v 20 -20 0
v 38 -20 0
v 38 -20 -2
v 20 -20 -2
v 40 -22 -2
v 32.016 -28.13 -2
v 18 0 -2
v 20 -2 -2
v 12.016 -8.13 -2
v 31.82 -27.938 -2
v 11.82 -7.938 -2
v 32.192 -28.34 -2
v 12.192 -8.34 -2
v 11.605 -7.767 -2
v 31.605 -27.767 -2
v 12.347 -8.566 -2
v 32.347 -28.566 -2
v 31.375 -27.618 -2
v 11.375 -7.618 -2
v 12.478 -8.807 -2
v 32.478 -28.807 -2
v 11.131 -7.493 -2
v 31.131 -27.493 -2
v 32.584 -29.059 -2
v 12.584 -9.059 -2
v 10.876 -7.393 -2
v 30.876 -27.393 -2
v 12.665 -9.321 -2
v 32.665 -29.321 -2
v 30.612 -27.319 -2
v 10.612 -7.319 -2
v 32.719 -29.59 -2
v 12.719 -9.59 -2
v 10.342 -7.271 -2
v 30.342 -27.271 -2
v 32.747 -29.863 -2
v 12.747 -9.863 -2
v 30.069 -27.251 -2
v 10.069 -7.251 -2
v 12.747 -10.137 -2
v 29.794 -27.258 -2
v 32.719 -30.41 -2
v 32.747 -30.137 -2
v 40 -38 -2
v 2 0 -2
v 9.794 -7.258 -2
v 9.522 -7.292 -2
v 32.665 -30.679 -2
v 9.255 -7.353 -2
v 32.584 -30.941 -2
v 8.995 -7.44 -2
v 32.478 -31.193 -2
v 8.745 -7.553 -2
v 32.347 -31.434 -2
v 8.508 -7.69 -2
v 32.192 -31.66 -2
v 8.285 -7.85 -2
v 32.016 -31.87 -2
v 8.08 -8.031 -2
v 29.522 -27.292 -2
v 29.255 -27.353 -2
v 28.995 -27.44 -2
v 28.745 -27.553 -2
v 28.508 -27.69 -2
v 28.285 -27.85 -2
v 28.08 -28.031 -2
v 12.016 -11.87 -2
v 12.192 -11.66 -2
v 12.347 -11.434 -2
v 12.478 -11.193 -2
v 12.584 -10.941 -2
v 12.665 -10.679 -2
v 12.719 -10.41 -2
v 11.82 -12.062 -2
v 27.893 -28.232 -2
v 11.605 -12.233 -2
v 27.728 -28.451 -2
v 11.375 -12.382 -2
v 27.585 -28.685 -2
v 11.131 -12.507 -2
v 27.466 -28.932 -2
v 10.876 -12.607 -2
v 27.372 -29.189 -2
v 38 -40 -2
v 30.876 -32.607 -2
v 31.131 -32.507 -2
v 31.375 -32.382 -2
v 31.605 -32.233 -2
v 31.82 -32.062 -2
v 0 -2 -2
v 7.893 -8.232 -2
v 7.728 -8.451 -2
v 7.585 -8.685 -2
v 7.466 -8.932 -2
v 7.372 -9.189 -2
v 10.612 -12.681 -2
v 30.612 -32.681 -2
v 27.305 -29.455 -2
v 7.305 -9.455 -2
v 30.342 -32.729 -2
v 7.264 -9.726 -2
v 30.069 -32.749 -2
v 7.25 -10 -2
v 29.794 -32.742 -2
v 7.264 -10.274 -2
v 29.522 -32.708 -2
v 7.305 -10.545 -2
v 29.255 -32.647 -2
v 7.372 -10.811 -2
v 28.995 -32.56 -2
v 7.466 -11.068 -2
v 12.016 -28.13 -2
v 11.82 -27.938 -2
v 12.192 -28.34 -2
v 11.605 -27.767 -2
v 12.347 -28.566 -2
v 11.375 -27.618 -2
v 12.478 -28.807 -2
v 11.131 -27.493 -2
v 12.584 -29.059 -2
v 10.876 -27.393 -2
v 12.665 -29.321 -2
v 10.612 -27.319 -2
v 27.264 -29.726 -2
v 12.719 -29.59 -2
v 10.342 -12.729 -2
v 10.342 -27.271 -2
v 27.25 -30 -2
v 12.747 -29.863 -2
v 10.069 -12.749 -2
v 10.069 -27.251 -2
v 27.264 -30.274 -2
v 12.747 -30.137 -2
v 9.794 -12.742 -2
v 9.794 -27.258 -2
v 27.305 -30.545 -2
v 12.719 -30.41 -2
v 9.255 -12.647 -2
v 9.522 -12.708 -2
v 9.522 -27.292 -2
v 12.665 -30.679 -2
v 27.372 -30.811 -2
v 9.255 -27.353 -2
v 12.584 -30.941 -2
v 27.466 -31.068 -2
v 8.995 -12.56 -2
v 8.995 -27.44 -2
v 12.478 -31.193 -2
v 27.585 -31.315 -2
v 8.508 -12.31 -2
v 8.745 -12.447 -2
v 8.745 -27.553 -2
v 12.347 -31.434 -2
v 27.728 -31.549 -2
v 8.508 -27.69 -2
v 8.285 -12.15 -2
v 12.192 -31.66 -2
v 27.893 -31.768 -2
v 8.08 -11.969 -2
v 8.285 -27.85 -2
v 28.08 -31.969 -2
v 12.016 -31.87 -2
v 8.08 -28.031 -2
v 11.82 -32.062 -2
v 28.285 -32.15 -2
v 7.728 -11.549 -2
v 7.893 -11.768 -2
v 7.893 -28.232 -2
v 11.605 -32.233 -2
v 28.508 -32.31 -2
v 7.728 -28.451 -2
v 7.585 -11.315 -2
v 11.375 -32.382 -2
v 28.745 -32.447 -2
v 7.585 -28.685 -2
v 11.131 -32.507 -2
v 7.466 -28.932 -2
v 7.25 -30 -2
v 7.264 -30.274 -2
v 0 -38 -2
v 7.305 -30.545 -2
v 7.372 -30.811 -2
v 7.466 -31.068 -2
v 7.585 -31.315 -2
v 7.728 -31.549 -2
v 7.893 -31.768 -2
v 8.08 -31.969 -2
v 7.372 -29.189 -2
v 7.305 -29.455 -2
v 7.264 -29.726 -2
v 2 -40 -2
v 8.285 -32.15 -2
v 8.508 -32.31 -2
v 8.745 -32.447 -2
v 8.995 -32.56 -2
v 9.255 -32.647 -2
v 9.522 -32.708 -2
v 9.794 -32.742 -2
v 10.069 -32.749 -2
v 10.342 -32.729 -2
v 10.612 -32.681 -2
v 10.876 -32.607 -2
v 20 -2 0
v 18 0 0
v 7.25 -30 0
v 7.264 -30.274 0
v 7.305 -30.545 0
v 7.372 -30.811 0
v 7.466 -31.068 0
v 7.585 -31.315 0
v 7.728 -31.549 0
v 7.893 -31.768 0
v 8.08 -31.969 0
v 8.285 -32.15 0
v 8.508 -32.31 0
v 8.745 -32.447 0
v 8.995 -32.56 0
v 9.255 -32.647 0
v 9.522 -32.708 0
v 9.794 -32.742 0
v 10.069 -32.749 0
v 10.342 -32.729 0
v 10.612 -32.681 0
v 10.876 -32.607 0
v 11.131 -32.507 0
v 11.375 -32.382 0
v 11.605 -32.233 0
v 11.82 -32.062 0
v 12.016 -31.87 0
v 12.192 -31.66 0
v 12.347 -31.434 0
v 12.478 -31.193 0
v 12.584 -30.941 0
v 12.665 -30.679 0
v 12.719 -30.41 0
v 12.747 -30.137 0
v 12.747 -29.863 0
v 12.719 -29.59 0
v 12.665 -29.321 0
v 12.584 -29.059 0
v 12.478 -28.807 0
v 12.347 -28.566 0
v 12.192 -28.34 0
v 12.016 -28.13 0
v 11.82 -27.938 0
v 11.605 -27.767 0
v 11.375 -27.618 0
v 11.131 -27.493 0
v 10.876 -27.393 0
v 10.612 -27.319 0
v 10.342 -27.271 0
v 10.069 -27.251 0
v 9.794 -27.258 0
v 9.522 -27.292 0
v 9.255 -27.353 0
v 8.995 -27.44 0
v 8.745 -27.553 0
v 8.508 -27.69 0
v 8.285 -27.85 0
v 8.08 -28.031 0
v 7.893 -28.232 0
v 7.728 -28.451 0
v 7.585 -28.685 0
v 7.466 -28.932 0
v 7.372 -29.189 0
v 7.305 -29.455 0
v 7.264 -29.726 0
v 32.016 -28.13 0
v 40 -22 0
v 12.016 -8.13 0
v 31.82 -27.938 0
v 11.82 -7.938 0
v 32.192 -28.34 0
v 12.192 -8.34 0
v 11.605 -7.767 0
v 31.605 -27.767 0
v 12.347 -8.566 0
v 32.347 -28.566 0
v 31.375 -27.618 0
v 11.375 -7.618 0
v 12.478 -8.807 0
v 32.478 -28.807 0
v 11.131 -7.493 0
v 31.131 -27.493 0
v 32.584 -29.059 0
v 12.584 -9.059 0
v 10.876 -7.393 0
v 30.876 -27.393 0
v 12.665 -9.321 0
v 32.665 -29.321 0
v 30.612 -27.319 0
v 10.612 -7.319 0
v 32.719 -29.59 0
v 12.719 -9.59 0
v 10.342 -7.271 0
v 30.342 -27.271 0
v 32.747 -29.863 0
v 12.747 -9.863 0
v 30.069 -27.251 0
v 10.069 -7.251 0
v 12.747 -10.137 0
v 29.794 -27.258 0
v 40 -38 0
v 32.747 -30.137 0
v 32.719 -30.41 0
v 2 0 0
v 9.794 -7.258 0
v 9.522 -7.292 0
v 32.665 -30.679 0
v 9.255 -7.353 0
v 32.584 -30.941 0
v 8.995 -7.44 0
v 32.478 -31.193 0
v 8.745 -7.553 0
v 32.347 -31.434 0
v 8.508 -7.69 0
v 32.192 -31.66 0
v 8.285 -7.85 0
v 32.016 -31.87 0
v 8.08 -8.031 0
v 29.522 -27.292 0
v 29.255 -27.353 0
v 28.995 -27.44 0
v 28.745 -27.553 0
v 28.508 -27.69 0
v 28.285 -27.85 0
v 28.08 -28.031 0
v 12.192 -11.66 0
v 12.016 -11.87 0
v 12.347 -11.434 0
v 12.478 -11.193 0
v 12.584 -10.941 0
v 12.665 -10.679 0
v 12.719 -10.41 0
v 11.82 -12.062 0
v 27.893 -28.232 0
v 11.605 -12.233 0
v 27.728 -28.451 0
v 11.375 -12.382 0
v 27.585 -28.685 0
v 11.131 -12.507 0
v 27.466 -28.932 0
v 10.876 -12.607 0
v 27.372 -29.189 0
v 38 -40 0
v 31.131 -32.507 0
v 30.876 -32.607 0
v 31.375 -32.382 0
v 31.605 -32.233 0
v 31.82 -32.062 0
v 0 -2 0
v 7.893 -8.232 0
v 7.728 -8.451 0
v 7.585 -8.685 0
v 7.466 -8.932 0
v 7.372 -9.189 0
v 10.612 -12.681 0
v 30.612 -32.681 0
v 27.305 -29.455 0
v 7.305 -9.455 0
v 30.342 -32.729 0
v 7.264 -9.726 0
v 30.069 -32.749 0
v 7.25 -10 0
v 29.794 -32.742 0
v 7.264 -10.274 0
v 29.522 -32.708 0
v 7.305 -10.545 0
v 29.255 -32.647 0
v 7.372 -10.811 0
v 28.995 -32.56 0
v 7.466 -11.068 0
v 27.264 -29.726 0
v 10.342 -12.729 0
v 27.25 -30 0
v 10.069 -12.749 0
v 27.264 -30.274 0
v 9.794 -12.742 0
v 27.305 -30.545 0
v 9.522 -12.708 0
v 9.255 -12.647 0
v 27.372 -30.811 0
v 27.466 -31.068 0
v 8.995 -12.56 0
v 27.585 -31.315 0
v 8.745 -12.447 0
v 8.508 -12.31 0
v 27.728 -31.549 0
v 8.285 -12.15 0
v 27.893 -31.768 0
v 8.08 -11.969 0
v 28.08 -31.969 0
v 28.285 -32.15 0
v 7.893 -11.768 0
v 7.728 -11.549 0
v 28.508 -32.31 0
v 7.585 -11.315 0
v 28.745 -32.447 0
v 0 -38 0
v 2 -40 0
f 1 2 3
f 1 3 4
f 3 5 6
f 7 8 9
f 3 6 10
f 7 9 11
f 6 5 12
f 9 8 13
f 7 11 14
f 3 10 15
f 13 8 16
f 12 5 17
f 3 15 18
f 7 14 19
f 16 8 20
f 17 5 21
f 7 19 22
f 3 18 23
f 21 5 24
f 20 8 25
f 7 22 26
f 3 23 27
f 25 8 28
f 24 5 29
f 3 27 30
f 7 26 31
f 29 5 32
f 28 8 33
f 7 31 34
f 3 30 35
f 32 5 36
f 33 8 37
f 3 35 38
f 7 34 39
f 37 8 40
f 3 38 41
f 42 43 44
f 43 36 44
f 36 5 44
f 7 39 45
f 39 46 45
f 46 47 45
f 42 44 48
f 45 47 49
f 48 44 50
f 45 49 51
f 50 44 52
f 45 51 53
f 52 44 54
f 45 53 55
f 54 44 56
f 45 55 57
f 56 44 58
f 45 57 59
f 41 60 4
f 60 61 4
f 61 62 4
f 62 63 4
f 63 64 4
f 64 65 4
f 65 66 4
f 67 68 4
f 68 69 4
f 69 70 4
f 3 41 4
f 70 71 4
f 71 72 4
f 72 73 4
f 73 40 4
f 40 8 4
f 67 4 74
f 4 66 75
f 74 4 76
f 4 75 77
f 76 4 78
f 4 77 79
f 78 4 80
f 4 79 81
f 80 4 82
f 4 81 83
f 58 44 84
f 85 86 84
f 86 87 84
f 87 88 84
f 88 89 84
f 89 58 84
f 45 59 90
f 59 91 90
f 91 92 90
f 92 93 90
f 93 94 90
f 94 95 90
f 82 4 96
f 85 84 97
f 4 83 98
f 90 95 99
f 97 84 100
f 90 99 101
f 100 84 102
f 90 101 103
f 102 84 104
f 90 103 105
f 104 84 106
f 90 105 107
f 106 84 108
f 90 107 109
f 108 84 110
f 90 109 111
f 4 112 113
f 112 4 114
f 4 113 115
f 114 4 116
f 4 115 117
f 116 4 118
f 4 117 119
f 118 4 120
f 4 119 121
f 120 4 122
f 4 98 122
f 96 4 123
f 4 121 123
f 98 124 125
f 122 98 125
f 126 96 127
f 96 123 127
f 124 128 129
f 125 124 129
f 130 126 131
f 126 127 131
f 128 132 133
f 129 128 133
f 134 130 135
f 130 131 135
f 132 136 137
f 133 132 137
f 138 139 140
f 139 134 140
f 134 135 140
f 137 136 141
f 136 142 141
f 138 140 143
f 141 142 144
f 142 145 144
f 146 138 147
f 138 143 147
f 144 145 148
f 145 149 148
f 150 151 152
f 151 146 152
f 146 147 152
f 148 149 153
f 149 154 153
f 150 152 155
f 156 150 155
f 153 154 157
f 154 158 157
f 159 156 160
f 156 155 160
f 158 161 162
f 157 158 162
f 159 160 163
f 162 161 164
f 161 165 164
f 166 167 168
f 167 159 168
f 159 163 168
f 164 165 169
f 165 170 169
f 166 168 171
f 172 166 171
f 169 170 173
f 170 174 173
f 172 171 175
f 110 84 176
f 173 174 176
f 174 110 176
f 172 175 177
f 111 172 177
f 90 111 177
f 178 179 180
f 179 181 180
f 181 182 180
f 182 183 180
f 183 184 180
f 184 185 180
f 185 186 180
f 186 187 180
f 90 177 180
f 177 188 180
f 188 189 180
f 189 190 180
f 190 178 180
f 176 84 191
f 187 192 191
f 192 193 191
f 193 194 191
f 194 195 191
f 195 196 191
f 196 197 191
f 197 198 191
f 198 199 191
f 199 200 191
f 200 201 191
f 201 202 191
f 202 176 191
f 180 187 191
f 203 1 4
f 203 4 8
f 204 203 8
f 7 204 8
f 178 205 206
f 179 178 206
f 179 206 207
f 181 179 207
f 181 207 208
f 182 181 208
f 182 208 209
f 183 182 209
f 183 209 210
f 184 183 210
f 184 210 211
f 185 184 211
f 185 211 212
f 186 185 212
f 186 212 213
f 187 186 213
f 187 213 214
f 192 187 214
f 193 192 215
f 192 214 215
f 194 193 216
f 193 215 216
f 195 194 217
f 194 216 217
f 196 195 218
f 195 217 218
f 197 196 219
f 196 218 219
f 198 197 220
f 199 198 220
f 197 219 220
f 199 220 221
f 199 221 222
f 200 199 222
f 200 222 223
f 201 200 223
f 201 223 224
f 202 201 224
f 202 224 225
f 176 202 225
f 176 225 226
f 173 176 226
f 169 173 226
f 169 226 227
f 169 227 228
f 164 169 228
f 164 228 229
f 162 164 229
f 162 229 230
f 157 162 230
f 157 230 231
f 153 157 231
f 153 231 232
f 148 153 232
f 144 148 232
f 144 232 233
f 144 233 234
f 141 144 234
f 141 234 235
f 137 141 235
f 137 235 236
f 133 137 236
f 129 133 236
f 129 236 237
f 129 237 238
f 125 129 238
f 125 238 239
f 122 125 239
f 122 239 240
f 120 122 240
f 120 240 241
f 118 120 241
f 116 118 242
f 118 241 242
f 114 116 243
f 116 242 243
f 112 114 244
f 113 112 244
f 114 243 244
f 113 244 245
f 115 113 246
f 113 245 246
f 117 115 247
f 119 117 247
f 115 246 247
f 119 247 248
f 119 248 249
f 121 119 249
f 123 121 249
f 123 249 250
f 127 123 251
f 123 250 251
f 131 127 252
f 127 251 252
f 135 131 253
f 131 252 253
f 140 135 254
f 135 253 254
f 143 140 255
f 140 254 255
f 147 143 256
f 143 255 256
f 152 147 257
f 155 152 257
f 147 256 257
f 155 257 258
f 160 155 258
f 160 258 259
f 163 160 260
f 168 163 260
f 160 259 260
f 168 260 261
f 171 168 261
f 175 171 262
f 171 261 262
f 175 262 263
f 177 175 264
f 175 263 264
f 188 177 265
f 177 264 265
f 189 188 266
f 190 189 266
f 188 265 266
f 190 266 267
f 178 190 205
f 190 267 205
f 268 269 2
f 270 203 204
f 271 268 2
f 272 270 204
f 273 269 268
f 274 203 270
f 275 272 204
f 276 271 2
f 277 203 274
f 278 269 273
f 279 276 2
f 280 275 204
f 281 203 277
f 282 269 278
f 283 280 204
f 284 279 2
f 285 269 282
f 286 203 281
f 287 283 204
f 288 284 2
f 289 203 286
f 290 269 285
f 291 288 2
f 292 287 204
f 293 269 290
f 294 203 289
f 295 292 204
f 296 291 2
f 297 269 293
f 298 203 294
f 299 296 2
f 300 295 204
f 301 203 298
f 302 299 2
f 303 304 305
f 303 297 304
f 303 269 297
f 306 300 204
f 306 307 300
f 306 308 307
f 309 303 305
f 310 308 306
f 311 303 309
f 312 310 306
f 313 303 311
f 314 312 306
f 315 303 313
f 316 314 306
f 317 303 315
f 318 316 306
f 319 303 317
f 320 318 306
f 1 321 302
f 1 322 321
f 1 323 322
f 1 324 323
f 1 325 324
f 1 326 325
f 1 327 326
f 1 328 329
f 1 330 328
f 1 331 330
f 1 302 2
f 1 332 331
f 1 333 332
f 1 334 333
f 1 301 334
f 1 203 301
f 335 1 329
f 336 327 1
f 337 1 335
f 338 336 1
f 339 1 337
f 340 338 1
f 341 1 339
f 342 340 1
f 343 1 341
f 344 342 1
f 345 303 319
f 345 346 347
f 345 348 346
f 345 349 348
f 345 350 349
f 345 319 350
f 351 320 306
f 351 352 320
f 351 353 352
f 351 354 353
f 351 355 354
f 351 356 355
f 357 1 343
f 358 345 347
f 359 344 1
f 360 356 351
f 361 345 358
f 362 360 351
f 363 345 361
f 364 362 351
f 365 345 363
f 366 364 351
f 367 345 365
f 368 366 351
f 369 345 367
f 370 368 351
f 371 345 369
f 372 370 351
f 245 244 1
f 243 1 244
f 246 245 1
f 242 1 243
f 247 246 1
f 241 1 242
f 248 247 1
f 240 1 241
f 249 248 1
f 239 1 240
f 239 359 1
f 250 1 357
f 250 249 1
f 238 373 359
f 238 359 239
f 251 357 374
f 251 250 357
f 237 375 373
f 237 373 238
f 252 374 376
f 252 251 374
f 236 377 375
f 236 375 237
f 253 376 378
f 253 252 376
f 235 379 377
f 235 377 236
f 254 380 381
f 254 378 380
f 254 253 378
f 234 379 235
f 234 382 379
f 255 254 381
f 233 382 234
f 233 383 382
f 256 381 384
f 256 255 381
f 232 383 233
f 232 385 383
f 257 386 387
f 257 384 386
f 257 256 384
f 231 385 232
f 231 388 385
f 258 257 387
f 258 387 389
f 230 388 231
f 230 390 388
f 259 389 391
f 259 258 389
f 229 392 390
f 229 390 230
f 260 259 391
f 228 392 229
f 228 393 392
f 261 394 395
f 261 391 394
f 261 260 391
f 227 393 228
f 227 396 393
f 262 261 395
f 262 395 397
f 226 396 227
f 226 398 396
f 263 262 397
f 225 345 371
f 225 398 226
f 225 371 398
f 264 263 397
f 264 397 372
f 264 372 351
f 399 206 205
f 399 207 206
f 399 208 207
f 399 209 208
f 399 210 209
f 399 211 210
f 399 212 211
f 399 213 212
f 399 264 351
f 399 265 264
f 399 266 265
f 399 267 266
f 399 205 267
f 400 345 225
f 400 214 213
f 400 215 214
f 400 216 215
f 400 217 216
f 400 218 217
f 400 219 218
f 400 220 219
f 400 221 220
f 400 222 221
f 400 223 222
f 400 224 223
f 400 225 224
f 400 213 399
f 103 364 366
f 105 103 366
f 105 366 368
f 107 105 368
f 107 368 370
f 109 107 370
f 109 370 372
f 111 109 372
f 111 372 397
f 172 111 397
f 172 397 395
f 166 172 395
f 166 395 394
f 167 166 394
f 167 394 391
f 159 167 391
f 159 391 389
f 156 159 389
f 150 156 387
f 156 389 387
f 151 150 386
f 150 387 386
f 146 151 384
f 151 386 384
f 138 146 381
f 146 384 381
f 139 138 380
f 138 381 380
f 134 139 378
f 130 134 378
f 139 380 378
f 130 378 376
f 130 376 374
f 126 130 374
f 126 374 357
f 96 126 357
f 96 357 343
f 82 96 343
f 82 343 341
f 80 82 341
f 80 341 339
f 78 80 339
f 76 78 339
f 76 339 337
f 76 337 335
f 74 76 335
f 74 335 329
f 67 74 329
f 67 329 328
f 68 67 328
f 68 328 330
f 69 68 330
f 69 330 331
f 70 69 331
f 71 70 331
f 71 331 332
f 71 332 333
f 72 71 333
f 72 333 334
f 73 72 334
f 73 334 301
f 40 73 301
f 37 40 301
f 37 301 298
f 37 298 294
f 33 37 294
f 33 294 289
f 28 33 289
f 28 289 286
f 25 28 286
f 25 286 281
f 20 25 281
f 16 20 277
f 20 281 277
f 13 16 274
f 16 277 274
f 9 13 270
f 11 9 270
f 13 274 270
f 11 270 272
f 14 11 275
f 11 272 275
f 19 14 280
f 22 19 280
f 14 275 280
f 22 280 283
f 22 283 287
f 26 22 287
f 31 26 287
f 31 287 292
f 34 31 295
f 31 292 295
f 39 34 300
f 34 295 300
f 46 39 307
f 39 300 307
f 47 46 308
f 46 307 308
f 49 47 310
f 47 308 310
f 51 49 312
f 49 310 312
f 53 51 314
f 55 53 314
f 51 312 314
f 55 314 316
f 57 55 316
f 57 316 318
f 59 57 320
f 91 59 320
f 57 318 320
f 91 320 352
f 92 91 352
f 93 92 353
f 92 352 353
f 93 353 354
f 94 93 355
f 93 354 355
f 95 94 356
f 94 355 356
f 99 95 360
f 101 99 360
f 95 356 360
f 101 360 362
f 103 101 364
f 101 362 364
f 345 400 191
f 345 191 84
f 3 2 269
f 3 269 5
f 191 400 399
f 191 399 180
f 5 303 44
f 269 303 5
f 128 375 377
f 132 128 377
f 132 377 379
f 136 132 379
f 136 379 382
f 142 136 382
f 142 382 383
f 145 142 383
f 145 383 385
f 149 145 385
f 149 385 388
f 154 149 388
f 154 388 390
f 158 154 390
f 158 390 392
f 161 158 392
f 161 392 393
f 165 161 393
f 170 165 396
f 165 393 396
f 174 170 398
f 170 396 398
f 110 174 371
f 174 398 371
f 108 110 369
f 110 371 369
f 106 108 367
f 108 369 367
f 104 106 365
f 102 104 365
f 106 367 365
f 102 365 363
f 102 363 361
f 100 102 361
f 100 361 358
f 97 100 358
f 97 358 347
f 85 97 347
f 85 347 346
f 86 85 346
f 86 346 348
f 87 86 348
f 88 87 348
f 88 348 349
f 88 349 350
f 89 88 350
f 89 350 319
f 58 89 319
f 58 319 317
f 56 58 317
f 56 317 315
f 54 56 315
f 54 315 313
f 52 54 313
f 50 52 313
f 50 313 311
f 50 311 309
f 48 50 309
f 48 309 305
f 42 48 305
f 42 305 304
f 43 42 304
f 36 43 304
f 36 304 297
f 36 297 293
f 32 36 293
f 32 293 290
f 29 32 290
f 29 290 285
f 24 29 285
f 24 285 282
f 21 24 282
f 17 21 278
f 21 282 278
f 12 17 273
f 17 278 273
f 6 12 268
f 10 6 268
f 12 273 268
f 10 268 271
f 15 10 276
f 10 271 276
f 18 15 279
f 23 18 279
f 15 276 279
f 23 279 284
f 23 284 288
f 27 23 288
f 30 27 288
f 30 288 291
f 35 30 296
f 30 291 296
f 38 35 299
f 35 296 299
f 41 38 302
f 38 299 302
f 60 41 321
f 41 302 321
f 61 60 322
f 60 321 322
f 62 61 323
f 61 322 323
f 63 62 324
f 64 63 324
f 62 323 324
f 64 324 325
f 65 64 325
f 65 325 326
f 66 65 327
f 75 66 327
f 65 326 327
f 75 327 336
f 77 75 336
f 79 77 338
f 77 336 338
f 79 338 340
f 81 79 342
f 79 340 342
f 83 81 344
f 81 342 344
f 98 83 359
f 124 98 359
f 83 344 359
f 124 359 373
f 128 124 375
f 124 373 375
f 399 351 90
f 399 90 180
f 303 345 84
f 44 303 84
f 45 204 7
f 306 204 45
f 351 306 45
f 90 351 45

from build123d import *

# Parameters (mm, degrees)
EXTRUDE_1_DEPTH   = 2
HOLE_WIZARD_M51_D = 5.5
CHAMFER_1_SIZE    = 2


with BuildPart() as part:
    # Эскиз1 → Бобышка-Вытянуть1 (new body)
    with BuildSketch(Plane(origin=(0, 0, 0), x_dir=(1, 0, 0), z_dir=(0, 0, -1))):
        Polygon((0, 0), (0, 40), (40, 40), (40, 20), (20, 20), (20, 0), align=None)
    extrude(amount=EXTRUDE_1_DEPTH)

    # Отверстие с зазором M51 (through all)
    with Locations(Plane(origin=(0, 0, -2), x_dir=(1, 0, 0), z_dir=(0, 0, -1))):
        with Locations((10, 30), (10, 10), (30, 30)):
            Hole(HOLE_WIZARD_M51_D / 2)

    # Фаска1
    chamfer_1_edges = [part.edges().sort_by_distance(p)[0] for p in [
        (0, 0, -1),
        (0, -40, -1),
        (40, -40, -1),
        (40, -20, -1),
        (20, 0, -1),
    ]]
    chamfer(chamfer_1_edges, length=CHAMFER_1_SIZE)


solid = part.part
